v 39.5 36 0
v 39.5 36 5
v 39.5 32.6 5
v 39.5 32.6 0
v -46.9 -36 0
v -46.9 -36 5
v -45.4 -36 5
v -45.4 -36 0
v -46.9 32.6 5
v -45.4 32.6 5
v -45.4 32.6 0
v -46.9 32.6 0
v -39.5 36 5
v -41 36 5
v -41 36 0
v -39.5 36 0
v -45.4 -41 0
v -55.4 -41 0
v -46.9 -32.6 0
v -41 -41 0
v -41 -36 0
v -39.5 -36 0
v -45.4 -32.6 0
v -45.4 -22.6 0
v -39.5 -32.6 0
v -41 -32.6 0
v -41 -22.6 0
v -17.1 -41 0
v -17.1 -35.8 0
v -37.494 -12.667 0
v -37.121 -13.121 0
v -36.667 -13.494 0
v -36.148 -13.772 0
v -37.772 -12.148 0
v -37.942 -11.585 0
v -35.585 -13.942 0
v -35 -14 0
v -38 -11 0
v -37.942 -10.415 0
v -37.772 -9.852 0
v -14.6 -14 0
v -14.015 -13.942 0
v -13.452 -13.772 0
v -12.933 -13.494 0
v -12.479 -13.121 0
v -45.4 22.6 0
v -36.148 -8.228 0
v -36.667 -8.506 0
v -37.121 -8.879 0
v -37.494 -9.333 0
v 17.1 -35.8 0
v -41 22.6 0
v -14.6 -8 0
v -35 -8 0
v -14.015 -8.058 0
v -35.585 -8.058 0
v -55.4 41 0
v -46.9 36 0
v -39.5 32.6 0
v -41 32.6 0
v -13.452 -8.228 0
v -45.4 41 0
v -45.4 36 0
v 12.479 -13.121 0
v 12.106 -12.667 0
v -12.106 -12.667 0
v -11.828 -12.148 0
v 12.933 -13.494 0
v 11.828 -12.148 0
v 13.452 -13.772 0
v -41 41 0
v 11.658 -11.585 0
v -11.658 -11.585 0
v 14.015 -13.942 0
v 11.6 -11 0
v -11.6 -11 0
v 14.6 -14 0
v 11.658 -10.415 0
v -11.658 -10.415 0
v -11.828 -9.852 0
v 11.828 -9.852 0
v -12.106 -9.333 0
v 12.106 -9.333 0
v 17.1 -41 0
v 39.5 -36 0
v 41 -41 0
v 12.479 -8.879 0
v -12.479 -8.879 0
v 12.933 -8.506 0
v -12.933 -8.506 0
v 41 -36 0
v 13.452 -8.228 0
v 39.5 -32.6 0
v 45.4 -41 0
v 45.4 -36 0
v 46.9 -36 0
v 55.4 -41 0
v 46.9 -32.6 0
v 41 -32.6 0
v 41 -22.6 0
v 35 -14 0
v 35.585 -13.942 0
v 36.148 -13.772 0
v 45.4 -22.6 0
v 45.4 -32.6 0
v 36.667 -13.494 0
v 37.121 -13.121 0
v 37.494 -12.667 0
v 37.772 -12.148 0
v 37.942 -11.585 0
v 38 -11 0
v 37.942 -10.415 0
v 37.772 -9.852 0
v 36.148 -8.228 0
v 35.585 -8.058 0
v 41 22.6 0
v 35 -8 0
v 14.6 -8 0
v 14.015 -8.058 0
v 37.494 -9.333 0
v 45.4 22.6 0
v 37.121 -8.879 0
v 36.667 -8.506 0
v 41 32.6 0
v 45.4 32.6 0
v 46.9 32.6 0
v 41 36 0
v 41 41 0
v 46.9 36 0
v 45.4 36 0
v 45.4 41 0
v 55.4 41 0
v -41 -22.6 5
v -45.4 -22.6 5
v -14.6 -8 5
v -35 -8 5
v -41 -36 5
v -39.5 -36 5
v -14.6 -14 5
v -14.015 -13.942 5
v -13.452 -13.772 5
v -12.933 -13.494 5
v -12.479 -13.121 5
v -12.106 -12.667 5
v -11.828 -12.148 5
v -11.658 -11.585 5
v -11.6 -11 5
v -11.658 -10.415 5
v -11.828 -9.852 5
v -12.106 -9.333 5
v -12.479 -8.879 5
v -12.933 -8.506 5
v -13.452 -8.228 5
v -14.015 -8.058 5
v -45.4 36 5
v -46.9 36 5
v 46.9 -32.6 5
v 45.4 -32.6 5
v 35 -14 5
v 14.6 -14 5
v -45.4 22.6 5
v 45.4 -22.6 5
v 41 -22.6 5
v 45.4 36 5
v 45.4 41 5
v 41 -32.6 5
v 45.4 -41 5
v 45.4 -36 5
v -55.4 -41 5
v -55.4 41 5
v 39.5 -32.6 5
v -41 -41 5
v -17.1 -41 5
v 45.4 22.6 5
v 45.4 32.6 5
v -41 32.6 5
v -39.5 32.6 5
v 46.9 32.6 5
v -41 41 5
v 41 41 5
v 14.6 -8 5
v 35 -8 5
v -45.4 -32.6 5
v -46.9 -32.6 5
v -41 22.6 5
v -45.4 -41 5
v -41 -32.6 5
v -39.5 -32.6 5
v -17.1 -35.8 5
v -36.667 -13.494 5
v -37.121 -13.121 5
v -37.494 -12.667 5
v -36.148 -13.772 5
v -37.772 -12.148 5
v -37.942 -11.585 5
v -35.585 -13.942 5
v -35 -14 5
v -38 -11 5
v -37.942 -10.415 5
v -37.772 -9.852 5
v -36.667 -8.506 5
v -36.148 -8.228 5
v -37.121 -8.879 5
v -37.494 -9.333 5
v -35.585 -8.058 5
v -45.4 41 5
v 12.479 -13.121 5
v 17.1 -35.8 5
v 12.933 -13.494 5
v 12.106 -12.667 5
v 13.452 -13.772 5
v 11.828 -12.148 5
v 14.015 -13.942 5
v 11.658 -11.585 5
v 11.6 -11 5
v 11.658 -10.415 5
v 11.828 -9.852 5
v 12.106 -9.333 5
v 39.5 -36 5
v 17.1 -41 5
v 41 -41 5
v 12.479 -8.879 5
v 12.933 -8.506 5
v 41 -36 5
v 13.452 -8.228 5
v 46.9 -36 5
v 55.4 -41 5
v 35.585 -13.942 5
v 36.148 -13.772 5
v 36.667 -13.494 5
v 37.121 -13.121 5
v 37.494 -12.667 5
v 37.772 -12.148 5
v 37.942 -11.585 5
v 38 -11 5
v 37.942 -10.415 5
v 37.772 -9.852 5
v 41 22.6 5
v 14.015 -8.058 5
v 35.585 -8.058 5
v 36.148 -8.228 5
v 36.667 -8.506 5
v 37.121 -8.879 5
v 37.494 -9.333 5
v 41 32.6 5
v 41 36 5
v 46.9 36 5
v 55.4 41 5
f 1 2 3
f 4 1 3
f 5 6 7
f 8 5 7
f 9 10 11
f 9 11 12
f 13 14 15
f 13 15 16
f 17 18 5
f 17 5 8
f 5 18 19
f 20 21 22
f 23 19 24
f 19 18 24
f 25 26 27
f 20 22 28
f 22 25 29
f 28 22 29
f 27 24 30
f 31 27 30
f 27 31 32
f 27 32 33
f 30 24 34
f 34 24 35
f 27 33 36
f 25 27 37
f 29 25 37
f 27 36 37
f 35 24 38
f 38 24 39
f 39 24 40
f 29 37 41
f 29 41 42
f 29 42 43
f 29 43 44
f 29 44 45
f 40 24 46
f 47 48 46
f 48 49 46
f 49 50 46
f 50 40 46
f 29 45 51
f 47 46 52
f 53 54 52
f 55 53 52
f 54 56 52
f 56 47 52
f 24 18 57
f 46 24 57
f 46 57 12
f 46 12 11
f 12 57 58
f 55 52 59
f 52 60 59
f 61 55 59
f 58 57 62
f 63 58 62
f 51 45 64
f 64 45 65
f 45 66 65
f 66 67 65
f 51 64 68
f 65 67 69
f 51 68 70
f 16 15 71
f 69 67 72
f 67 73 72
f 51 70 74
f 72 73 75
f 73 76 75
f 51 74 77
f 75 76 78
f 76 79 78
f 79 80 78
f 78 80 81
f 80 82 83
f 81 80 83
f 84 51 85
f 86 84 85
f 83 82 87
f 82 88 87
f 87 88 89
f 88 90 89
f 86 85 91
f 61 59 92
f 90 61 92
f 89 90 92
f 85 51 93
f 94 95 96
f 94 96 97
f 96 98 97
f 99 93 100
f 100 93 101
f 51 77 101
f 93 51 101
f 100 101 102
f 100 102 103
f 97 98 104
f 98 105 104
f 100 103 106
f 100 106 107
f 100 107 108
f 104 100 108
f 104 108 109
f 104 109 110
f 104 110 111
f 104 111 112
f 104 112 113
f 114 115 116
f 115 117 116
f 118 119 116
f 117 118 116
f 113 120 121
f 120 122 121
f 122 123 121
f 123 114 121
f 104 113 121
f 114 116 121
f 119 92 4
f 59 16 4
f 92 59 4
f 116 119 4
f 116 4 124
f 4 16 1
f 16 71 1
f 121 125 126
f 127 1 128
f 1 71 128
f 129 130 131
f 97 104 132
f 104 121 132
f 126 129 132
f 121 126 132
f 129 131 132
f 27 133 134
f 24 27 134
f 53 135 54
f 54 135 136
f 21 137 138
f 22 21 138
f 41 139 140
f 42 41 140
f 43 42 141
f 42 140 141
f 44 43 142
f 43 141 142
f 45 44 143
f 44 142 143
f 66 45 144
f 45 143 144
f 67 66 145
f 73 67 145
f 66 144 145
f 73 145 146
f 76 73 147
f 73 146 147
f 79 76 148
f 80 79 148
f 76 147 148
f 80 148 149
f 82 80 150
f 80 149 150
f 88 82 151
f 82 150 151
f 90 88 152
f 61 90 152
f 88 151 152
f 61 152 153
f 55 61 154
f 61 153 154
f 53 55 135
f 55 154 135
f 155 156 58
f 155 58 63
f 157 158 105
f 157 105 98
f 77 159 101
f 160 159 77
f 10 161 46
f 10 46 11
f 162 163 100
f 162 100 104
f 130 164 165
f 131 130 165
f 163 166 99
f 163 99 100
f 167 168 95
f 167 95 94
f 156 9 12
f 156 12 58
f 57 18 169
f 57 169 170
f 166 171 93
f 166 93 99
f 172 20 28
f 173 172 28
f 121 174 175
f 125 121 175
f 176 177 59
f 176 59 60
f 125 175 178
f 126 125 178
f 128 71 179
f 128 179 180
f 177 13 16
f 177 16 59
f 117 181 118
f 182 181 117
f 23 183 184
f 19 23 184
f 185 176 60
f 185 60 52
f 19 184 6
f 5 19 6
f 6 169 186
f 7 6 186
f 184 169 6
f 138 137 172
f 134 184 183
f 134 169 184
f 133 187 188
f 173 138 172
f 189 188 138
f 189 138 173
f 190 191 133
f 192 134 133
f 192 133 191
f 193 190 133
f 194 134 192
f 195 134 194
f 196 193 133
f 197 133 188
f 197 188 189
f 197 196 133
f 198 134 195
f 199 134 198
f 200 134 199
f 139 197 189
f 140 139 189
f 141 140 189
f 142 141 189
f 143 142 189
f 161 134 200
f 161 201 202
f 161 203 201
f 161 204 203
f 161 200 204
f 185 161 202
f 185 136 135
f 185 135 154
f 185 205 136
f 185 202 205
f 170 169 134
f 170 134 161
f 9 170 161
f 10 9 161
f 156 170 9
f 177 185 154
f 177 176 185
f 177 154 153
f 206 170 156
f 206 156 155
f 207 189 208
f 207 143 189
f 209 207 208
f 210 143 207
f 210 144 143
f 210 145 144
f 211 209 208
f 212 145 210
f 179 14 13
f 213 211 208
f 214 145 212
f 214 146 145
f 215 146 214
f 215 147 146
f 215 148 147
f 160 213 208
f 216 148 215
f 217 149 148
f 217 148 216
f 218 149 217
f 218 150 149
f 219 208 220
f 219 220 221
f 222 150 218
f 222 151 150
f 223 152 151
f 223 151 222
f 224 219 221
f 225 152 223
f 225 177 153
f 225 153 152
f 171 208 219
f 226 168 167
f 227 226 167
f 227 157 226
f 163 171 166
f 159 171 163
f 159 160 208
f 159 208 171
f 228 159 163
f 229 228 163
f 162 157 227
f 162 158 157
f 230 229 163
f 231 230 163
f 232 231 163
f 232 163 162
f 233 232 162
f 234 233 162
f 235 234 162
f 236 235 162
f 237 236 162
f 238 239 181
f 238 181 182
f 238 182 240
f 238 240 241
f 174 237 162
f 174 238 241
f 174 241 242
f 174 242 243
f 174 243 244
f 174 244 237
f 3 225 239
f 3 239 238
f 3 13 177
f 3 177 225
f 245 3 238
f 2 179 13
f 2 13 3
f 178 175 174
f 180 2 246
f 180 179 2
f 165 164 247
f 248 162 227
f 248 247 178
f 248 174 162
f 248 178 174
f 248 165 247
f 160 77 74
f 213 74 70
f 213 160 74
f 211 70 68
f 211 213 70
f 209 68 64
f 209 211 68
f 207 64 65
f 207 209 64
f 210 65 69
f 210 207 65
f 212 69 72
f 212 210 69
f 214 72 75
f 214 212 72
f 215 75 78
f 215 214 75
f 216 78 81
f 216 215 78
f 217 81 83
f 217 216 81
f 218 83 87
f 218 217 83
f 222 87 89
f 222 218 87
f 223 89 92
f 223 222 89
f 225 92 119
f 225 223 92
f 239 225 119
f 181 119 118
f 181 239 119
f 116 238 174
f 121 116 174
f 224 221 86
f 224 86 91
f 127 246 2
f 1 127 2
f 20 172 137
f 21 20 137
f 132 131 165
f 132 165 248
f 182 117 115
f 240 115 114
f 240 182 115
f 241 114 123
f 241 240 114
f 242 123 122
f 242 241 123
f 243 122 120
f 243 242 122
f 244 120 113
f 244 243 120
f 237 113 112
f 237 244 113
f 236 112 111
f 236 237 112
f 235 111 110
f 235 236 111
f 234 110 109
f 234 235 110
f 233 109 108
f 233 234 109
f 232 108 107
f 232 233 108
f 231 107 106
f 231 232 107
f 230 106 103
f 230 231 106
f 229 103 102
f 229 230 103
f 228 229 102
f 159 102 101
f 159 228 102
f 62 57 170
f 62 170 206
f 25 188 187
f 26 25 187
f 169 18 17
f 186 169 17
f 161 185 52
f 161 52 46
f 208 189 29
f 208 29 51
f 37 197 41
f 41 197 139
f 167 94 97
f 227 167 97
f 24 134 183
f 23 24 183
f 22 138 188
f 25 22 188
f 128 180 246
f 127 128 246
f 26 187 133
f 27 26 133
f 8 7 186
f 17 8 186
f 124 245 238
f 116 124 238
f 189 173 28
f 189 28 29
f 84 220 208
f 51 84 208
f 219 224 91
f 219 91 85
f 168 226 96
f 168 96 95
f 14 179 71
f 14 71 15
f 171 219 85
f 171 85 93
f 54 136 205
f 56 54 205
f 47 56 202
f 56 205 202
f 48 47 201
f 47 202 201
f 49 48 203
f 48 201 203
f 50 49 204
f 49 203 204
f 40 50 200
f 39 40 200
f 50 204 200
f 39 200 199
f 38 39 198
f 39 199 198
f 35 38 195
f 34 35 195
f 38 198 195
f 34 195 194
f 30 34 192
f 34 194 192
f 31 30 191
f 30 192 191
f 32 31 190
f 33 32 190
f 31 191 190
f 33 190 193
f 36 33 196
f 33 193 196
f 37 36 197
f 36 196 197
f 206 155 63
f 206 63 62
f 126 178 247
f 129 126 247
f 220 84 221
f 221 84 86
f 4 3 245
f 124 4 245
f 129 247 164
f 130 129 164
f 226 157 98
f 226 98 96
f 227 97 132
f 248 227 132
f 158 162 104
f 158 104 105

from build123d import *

# Parameters (mm, degrees)
SKETCH1_W           = 110.8
SKETCH1_H           = 82
BOSS_EXTRUDE1_DEPTH = 5
CUT_EXTRUDE1_DEPTH  = 10
SKETCH3_W           = 34.2
SKETCH3_H           = 5.2
CUT_EXTRUDE2_DEPTH  = 10
CUT_EXTRUDE3_DEPTH  = 10


with BuildPart() as part:
    # Sketch1 → Boss-Extrude1 (new body)
    with BuildSketch(Plane.XY):
        Rectangle(SKETCH1_W, SKETCH1_H)
    extrude(amount=BOSS_EXTRUDE1_DEPTH)

    # Sketch2 → Cut-Extrude1 (cut)
    with BuildSketch(Plane.XY.offset(5)):
        Polygon((41, -32.6), (41, -22.6), (45.4, -22.6), (45.4, -32.6), (46.9, -32.6), (46.9, -36), (45.4, -36), (45.4, -41), (41, -41), (41, -36), (39.5, -36), (39.5, -32.6), align=None)
        Polygon((-41, 32.6), (-41, 22.6), (-45.4, 22.6), (-45.4, 32.6), (-46.9, 32.6), (-46.9, 36), (-45.4, 36), (-45.4, 41), (-41, 41), (-41, 36), (-39.5, 36), (-39.5, 32.6), align=None)
        Polygon((45.4, 22.6), (45.4, 32.6), (46.9, 32.6), (46.9, 36), (45.4, 36), (45.4, 41), (41, 41), (41, 36), (39.5, 36), (39.5, 32.6), (41, 32.6), (41, 22.6), align=None)
        Polygon((-45.4, -22.6), (-45.4, -32.6), (-46.9, -32.6), (-46.9, -36), (-45.4, -36), (-45.4, -41), (-41, -41), (-41, -36), (-39.5, -36), (-39.5, -32.6), (-41, -32.6), (-41, -22.6), align=None)
    extrude(amount=-CUT_EXTRUDE1_DEPTH, mode=Mode.SUBTRACT)

    # Sketch3 → Cut-Extrude2 (cut)
    with BuildSketch(Plane.XY.offset(5)):
        with Locations((0, -38.4)):
            Rectangle(SKETCH3_W, SKETCH3_H)
    extrude(amount=-CUT_EXTRUDE2_DEPTH, mode=Mode.SUBTRACT)

    # Sketch4 → Cut-Extrude3 (cut)
    with BuildSketch(Plane.XY.offset(5)):
        with BuildLine():
            Line((35, -14), (14.6, -14))
            ThreePointArc((14.6, -14), (11.6, -11), (14.6, -8))
            Line((14.6, -8), (35, -8))
            ThreePointArc((35, -8), (38, -11), (35, -14))
        make_face()
        with BuildLine():
            Line((-14.6, -8), (-35, -8))
            ThreePointArc((-35, -8), (-38, -11), (-35, -14))
            Line((-35, -14), (-14.6, -14))
            ThreePointArc((-14.6, -14), (-11.6, -11), (-14.6, -8))
        make_face()
    extrude(amount=-CUT_EXTRUDE3_DEPTH, mode=Mode.SUBTRACT)


solid = part.part
